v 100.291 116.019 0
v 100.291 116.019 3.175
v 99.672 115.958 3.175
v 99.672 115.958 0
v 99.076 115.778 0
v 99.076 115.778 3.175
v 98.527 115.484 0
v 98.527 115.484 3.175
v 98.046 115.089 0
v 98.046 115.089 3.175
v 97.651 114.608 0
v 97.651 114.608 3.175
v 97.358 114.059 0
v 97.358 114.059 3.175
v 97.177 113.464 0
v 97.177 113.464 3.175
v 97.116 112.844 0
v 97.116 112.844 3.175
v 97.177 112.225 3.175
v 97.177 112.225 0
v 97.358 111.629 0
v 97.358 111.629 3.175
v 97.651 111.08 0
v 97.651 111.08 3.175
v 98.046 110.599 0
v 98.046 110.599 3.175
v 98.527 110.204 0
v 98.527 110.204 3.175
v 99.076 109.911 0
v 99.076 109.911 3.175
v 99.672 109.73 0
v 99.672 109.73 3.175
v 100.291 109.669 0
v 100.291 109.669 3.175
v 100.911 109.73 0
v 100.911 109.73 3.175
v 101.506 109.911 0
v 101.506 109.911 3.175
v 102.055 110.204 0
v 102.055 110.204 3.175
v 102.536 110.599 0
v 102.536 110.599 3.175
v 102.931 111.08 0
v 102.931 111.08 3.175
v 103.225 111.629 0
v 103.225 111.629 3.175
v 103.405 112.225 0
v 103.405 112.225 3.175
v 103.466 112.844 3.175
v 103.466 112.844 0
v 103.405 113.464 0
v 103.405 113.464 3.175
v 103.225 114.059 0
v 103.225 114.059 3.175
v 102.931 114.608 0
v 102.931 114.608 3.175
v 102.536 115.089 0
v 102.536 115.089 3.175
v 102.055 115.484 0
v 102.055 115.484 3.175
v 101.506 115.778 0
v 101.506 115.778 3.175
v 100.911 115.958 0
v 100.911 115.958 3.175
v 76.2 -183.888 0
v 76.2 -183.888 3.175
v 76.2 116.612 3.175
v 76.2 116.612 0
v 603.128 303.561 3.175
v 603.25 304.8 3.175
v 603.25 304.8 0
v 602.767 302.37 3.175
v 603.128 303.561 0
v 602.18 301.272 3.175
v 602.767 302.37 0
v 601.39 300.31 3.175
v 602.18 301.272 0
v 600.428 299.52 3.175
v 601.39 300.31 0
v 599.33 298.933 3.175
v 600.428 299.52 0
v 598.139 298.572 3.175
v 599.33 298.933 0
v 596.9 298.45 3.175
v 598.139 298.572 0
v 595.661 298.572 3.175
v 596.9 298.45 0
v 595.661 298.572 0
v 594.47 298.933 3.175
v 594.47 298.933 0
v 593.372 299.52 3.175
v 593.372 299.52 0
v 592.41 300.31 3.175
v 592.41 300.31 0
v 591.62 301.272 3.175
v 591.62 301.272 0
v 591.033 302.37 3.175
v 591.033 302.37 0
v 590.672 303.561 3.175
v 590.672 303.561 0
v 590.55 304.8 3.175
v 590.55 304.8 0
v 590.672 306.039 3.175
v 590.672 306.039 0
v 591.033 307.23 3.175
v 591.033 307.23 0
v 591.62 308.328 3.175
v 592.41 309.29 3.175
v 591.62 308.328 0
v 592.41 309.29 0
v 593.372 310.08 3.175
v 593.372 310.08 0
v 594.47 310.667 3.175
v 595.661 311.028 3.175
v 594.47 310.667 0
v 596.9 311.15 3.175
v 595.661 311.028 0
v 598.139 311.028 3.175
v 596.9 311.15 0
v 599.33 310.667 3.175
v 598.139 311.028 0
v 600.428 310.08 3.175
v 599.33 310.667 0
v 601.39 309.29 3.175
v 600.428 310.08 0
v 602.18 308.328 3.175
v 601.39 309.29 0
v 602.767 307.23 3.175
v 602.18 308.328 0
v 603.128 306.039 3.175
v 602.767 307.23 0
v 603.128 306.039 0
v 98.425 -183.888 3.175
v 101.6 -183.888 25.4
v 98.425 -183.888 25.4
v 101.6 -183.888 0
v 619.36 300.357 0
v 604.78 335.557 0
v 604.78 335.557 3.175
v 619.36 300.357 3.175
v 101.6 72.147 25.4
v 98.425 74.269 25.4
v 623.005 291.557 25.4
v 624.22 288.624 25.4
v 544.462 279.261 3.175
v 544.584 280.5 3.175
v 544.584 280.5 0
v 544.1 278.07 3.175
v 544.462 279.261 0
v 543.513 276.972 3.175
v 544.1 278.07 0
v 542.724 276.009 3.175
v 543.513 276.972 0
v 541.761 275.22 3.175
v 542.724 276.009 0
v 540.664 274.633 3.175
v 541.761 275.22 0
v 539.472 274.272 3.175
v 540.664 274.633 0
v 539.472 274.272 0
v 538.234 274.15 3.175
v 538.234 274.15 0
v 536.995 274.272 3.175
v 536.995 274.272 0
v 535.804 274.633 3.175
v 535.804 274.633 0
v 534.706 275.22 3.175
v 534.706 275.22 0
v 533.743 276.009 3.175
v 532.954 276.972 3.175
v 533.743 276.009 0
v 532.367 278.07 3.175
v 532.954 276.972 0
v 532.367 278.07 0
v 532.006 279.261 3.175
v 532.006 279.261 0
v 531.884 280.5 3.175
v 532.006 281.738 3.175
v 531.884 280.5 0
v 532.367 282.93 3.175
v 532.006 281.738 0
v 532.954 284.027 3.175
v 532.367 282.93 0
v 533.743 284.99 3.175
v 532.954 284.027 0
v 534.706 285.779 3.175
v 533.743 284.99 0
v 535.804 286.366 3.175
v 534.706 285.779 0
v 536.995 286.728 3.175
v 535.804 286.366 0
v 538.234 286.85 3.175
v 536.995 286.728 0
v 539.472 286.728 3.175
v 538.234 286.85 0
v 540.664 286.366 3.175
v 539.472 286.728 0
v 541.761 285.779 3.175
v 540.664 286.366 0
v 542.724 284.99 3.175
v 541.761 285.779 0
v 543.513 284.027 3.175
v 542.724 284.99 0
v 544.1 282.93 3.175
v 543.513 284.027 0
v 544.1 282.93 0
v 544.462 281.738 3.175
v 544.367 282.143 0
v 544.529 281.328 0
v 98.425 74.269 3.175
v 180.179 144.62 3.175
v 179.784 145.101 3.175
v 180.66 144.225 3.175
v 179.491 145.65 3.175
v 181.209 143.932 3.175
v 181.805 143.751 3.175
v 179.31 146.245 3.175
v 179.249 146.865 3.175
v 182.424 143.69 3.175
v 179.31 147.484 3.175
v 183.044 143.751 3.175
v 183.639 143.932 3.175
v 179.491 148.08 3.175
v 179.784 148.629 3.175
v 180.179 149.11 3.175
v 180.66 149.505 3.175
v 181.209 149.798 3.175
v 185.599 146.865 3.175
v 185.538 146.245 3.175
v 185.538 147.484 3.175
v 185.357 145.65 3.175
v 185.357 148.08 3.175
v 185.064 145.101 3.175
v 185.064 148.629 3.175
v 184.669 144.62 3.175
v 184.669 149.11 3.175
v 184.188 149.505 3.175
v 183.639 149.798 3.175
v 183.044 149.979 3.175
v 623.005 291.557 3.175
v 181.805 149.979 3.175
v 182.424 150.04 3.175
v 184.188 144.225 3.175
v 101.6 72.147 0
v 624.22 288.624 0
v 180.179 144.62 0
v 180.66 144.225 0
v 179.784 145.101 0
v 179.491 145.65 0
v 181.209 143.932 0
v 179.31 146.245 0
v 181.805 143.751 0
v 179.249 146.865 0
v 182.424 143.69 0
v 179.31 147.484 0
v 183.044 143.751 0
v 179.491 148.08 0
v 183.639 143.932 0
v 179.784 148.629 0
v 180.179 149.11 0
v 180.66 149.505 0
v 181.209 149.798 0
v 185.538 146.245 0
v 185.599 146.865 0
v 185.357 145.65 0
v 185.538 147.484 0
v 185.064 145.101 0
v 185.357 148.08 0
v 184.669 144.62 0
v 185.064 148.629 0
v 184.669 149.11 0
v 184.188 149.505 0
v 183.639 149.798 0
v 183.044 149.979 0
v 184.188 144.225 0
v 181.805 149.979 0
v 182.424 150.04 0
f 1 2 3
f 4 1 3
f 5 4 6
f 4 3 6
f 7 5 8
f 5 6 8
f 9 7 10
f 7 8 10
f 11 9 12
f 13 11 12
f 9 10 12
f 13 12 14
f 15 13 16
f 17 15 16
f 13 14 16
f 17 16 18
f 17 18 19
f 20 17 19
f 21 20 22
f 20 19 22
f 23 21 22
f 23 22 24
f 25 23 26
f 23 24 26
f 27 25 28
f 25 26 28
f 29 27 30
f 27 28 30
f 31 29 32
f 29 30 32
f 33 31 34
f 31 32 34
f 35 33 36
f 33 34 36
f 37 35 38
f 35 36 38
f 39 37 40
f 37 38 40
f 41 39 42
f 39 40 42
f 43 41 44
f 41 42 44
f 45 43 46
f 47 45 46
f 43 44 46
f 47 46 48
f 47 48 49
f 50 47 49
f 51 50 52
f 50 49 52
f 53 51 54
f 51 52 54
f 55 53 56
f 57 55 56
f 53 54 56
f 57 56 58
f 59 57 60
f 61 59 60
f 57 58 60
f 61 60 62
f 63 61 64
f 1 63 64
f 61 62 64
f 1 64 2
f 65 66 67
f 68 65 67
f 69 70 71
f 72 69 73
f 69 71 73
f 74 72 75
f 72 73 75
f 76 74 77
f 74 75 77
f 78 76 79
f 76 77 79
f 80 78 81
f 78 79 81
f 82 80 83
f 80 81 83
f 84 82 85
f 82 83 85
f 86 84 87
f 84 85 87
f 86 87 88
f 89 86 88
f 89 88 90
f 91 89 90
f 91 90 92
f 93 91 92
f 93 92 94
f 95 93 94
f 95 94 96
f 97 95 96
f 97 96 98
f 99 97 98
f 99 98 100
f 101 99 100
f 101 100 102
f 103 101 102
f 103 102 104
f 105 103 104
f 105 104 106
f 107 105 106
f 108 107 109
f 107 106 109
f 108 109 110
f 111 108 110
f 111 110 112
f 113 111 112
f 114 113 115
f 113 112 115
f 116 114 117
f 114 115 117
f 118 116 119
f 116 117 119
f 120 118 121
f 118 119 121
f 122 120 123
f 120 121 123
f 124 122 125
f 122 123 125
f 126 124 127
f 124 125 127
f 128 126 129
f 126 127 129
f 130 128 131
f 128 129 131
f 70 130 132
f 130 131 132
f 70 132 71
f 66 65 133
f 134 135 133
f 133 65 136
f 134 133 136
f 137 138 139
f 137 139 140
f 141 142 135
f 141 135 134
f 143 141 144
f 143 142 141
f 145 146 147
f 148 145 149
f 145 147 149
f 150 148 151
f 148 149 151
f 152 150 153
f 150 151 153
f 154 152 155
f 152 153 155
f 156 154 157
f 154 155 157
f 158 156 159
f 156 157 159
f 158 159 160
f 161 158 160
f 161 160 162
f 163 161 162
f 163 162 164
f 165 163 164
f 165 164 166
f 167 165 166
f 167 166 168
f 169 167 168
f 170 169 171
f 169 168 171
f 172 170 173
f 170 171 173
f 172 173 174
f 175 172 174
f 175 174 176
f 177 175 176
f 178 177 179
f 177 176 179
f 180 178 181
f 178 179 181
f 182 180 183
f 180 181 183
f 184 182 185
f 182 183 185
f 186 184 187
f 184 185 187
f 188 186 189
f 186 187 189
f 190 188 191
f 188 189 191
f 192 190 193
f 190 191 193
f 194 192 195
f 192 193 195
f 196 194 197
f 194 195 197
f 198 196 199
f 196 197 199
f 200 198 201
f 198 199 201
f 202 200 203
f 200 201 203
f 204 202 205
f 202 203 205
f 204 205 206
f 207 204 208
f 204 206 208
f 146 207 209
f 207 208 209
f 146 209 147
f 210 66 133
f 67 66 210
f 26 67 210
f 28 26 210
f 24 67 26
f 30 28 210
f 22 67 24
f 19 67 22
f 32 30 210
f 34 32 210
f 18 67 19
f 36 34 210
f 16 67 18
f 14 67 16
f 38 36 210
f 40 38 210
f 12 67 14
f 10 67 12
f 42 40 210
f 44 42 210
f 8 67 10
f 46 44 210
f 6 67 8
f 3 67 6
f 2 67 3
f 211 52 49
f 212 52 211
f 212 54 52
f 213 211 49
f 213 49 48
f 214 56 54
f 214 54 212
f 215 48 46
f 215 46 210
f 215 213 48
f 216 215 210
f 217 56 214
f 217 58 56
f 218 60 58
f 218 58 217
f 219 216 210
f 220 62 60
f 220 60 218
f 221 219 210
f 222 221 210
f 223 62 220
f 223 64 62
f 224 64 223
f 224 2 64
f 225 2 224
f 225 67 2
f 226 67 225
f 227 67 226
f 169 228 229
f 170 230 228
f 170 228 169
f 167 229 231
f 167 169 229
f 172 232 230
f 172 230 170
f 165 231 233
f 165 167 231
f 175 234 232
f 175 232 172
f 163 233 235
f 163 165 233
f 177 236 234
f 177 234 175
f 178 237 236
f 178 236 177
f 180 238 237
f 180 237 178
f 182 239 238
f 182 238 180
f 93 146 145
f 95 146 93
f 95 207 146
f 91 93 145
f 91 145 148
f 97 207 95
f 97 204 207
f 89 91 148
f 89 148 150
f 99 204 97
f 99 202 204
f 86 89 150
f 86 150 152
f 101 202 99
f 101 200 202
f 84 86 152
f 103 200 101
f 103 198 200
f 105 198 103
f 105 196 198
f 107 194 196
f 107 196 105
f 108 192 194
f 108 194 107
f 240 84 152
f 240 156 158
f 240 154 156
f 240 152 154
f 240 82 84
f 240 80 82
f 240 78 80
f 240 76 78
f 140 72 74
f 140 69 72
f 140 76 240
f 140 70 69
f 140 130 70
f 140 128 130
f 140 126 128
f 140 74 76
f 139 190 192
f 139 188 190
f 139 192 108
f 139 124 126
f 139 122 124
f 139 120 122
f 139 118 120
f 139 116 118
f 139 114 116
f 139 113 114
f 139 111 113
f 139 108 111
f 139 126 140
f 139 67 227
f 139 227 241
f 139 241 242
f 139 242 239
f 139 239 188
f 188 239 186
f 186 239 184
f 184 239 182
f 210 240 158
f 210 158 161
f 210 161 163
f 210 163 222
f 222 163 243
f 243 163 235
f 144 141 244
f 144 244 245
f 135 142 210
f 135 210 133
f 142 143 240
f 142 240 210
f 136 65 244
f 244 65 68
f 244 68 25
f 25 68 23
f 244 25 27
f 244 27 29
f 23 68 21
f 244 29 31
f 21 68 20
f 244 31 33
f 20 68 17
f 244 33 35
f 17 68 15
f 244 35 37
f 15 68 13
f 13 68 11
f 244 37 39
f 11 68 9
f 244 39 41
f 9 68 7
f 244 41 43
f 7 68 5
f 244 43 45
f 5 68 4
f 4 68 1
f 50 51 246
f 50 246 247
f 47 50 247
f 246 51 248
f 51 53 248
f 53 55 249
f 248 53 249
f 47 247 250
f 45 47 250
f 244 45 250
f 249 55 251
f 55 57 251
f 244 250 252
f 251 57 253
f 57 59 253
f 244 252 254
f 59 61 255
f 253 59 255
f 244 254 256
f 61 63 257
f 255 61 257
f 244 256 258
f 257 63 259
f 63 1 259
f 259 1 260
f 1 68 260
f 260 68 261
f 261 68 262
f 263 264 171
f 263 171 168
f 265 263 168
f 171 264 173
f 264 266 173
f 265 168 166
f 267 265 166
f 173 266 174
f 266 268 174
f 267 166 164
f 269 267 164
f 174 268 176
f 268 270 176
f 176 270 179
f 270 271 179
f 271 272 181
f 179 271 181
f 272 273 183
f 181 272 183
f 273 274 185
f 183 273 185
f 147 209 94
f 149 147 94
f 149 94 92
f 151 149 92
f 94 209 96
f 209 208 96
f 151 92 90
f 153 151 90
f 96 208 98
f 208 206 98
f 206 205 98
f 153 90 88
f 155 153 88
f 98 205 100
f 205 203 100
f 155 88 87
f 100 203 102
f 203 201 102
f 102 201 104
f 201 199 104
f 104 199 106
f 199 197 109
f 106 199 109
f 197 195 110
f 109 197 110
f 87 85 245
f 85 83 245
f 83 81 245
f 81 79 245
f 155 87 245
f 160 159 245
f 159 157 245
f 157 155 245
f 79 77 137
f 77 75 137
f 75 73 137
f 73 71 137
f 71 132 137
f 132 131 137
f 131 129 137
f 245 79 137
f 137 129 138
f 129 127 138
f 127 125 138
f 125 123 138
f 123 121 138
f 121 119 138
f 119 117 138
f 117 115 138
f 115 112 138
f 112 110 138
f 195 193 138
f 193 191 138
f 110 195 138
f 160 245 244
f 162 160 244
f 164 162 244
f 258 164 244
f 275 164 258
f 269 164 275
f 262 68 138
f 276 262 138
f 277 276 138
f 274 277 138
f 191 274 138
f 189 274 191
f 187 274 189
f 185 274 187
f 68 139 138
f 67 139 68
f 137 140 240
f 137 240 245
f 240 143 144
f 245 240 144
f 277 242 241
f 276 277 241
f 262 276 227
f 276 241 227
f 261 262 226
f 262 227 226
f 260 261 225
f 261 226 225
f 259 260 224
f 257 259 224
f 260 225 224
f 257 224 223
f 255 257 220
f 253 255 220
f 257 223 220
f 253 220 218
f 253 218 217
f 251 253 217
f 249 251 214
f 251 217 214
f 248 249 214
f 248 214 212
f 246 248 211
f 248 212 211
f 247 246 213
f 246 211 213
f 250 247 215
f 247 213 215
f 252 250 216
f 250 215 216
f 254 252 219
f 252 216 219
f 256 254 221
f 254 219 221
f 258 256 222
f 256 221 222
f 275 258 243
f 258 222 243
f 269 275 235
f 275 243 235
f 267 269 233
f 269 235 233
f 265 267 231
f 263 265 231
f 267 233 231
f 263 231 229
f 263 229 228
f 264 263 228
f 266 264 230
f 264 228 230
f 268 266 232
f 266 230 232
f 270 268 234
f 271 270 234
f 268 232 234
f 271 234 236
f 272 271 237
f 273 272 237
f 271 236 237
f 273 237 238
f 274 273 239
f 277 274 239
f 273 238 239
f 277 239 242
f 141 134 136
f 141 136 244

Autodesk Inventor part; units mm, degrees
ref_plane "YZ Plane" through (0, 0, 0) normal (1, 0, 0) x (0, 1, 0)
ref_plane "XZ Plane" through (0, 0, 0) normal (0, 1, 0) x (-1, 0, 0)
ref_plane "Work Plane1" through (0, 0, 0) normal (0, 0, 1) x (1, 0, 0)
sketch "Sketch1" plane through (0, 0, 0) normal (0, 0, 1) x (1, 0, 0)
  line L0 (0, 0) -> (63.5, 0)
  line L1 (63.5, 0) -> (63.5, 482.6)
  line L2 (63.5, 482.6) -> (0, 482.6)
  line L3 (0, 482.6) -> (0, 0)
  line L4 (63.5, 482.6) -> (63.5, 406.4)
  line L5 (63.5, 482.6) -> (139.7, 482.6) construction
  line L6 (63.5, 406.4) -> (-63.5, 406.4)
  line L7 (63.5, 406.4) -> (63.5, 304.8)
  line L8 (63.5, 406.4) -> (165.1, 406.4) construction
  line L9 (63.5, 304.8) -> (1409.7, 304.8)
  line L10 (63.5, 304.8) -> (596.9, 304.8)
  circle A0 centre (596.9, 304.8) radius 88.9
  circle A1 centre (596.9, 304.8) radius 6.35
  line L11 (596.9, 304.8) -> (1174.248, 304.8) construction
  line L12 (596.9, 304.8) -> (538.2336, 280.4996)
  circle A2 centre (538.2336, 280.4996) radius 6.35
  line L13 (596.9, 304.8) -> (614.4999, 312.0901)
  line L14 (596.9, 304.8) -> (615.95, 304.8) construction
  line L15 (614.4999, 312.0901) -> (619.36, 300.3568)
  line L16 (619.36, 300.3568) -> (63.5, 70.1121)
  line L17 (614.4999, 312.0901) -> (609.6398, 323.8234)
  line L18 (614.4999, 312.0901) -> (627.1999, 312.0901) construction
  line L19 (609.6398, 323.8234) -> (63.5, 97.6049)
  line L20 (63.5, 70.1121) -> (63.5, -183.8879)
  line L21 (63.5, 70.1121) -> (317.5, 70.1121) construction
  line L22 (63.5, -183.8879) -> (88.9, -183.8879)
  line L23 (88.9, -183.8879) -> (88.9, 80.6331)
  dimension "d0" = 63.5
  dimension "d1" = 482.6
  dimension "d2" = 76.2
  dimension "d3" = 90
  dimension "d4" = 127
  dimension "d5" = 90
  dimension "d6" = 101.6
  dimension "d7" = 90
  dimension "d8" = 1346.2
  dimension "d9" = 90
  dimension "d10" = 533.4
  dimension "d11" = 177.8
  dimension "d12" = 12.7
  dimension "d14" = 63.5
  dimension "d15" = 12.7
  dimension "d16" = 19.05
  dimension "d17" = 22.5
  dimension "d18" = 12.7
  dimension "d19" = 90
  dimension "d20" = 90
  dimension "d21" = 12.7
  dimension "d22" = 112.5
  dimension "d23" = 591.1375
  dimension "d24" = 90
  dimension "d25" = 254
  dimension "d26" = 90
  dimension "d27" = 25.4
  dimension "d28" = 90
  dimension "d29" = 90
extrude "Extrusion1" add sketch "Sketch1" along normal blind 25.4 contours L1 L16 L23 L22 L20 | L1 L19 A0 L16 | L19 L9 A1 L15 L16 A0 | L19 L17 L13 A1 L9 | L9 A1 L13 L15
sketch "Sketch2" plane through (0, 0, 25.4) normal (0, 0, 1) x (1, 0, 0)
  circle A0 centre (596.9, 304.8) radius 6.35 projected
  line L0 (88.9, 80.6331) -> (619.36, 300.3568) projected
  line L1 (619.36, 300.3568) -> (609.6398, 323.8234) projected
  line L2 (609.6398, 323.8234) -> (63.5, 97.6049) projected
  line L3 (63.5, 97.6049) -> (63.5, -183.8879) projected
  line L4 (63.5, -183.8879) -> (88.9, -183.8879) projected
  line L5 (88.9, -183.8879) -> (88.9, 80.6331) projected
  line L6 (596.9, 304.8) -> (614.4999, 312.0901)
  line L7 (596.9, 304.8) -> (615.95, 304.8) construction
  line L8 (614.4999, 312.0901) -> (604.7797, 335.5567)
  line L9 (614.4999, 312.0901) -> (639.8999, 312.0901) construction
  line L10 (604.7797, 335.5567) -> (624.2201, 288.6236)
  line L11 (624.2201, 288.6236) -> (1203.6463, 288.6236) construction
  line L12 (604.7797, 335.5567) -> (1190.6567, 335.5567) construction
  line L13 (76.2, -183.8879) -> (101.6, -183.8879)
  line L14 (101.6, -183.8879) -> (50.8, -183.8879)
  line L15 (101.6, -183.8879) -> (101.6, 72.1473)
  line L16 (101.6, 72.1473) -> (624.2201, 288.6236)
  line L17 (604.7797, 335.5567) -> (50.8, 106.0907)
  line L18 (604.7797, 335.5567) -> (1204.4031, 335.5567) construction
  line L19 (50.8, 106.0907) -> (50.8, -183.8879)
  point P0 (0, 0)
  dimension "d32" = 22.5
  dimension "d33" = 25.4
  dimension "d34" = 112.5
  dimension "d35" = 50.8
  dimension "d36" = 0
  dimension "d39" = 25.4
  dimension "d40" = 50.8
  dimension "d42" = 157.5
extrude "Extrusion2" add sketch "Sketch2" against normal blind 25.4 contours L10 L16 L15 L13 L5 L0 | L2 L3 L14 L19 L17 L8
sketch "Sketch4" plane through (0, 0, 25.4) normal (0, 0, 1) x (1, 0, 0)
  line L0 (604.7797, 335.5567) -> (50.8, 106.0907) projected
  line L1 (50.8, 106.0907) -> (50.8, -183.8879) projected
  line L2 (50.8, -183.8879) -> (101.6, -183.8879) projected
  line L3 (101.6, -183.8879) -> (101.6, 72.1473) projected
  line L4 (76.2, -183.8879) -> (76.2, 116.6118)
  point P0 (0, 0)
extrude "Extrusion3" cut sketch "Sketch4" against normal blind 25.4
sketch "Sketch5" plane through (0, 0, 25.4) normal (0, 0, 1) x (1, 0, 0)
  line L0 (76.2, 116.6118) -> (76.2, -183.8879) projected
  line L1 (76.2, -183.8879) -> (101.6, -183.8879) projected
  line L2 (101.6, -183.8879) -> (101.6, 72.1473) projected
  line L3 (101.6, 72.1473) -> (624.2201, 288.6236) projected
  line L4 (624.2201, 288.6236) -> (604.7797, 335.5567) projected
  line L5 (604.7797, 335.5567) -> (76.2, 116.6118) projected
  circle A0 centre (538.2336, 280.4996) radius 6.35 projected
  circle A1 centre (596.9, 304.8) radius 6.35 projected
  line L6 (101.6, -183.8879) -> (98.425, -183.8879)
  line L7 (101.6, -183.8879) -> (104.775, -183.8879) construction
  line L8 (624.2201, 288.6236) -> (623.005, 291.5569)
  line L9 (624.2201, 288.6236) -> (627.3951, 288.6236) construction
  line L10 (623.005, 291.5569) -> (98.425, 74.2687)
  line L11 (98.425, 74.2687) -> (98.425, -183.8879)
  point P0 (0, 0)
  dimension "d61" = 3.175
  dimension "d62" = 180
  dimension "d63" = 3.175
  dimension "d64" = 112.5
  dimension "d65" = 90
extrude "Extrusion4" cut sketch "Sketch5" against normal blind 22.225 contours L5 L4 L10 L11 L1 L0
sketch "Sketch9" plane through (0, 0, 0) normal (0, 0, -1) x (-1, 0, 0)
  line L0 (-76.2, 116.6118) -> (-604.7797, 335.5567) projected
  line L1 (-624.2201, 288.6236) -> (-101.6, 72.1473) projected
  line L2 (19.4758, 63.2352) -> (-215.1896, 160.4367) construction
  line L3 (19.4758, 63.2352) -> (273.4758, 63.2352) construction
  line L4 (-187.2842, 135.1316) -> (-172.0436, 171.9256) construction
  line L5 (-105.5381, 100.1773) -> (-86.2353, 146.7783) construction
  line L6 (-76.2, -183.8879) -> (-76.2, 116.6118) projected
  line L7 (-76.2, 102.8654) -> (-100.2912, 112.8443) construction
  line L8 (-101.6, 72.1473) -> (-76.2, 116.6118) construction
  point P0 (0, 0)
  point P1 (-182.4241, 146.8649)
  dimension "d85" = 254
  dimension "d86" = 157.5
  dimension "d89" = 12.7
  dimension "d91" = 88.9
  dimension "d100" = 19.05
hole "Hole2" at (182.4241, 146.8649, 0) direction (0, 0, 1) diameter 6.35 end through all
hole "Hole3" at (100.2912, 112.8443, 0) direction (0, 0, 1) diameter 6.35 end through all
properties part number "CatapultArmL-Right"
